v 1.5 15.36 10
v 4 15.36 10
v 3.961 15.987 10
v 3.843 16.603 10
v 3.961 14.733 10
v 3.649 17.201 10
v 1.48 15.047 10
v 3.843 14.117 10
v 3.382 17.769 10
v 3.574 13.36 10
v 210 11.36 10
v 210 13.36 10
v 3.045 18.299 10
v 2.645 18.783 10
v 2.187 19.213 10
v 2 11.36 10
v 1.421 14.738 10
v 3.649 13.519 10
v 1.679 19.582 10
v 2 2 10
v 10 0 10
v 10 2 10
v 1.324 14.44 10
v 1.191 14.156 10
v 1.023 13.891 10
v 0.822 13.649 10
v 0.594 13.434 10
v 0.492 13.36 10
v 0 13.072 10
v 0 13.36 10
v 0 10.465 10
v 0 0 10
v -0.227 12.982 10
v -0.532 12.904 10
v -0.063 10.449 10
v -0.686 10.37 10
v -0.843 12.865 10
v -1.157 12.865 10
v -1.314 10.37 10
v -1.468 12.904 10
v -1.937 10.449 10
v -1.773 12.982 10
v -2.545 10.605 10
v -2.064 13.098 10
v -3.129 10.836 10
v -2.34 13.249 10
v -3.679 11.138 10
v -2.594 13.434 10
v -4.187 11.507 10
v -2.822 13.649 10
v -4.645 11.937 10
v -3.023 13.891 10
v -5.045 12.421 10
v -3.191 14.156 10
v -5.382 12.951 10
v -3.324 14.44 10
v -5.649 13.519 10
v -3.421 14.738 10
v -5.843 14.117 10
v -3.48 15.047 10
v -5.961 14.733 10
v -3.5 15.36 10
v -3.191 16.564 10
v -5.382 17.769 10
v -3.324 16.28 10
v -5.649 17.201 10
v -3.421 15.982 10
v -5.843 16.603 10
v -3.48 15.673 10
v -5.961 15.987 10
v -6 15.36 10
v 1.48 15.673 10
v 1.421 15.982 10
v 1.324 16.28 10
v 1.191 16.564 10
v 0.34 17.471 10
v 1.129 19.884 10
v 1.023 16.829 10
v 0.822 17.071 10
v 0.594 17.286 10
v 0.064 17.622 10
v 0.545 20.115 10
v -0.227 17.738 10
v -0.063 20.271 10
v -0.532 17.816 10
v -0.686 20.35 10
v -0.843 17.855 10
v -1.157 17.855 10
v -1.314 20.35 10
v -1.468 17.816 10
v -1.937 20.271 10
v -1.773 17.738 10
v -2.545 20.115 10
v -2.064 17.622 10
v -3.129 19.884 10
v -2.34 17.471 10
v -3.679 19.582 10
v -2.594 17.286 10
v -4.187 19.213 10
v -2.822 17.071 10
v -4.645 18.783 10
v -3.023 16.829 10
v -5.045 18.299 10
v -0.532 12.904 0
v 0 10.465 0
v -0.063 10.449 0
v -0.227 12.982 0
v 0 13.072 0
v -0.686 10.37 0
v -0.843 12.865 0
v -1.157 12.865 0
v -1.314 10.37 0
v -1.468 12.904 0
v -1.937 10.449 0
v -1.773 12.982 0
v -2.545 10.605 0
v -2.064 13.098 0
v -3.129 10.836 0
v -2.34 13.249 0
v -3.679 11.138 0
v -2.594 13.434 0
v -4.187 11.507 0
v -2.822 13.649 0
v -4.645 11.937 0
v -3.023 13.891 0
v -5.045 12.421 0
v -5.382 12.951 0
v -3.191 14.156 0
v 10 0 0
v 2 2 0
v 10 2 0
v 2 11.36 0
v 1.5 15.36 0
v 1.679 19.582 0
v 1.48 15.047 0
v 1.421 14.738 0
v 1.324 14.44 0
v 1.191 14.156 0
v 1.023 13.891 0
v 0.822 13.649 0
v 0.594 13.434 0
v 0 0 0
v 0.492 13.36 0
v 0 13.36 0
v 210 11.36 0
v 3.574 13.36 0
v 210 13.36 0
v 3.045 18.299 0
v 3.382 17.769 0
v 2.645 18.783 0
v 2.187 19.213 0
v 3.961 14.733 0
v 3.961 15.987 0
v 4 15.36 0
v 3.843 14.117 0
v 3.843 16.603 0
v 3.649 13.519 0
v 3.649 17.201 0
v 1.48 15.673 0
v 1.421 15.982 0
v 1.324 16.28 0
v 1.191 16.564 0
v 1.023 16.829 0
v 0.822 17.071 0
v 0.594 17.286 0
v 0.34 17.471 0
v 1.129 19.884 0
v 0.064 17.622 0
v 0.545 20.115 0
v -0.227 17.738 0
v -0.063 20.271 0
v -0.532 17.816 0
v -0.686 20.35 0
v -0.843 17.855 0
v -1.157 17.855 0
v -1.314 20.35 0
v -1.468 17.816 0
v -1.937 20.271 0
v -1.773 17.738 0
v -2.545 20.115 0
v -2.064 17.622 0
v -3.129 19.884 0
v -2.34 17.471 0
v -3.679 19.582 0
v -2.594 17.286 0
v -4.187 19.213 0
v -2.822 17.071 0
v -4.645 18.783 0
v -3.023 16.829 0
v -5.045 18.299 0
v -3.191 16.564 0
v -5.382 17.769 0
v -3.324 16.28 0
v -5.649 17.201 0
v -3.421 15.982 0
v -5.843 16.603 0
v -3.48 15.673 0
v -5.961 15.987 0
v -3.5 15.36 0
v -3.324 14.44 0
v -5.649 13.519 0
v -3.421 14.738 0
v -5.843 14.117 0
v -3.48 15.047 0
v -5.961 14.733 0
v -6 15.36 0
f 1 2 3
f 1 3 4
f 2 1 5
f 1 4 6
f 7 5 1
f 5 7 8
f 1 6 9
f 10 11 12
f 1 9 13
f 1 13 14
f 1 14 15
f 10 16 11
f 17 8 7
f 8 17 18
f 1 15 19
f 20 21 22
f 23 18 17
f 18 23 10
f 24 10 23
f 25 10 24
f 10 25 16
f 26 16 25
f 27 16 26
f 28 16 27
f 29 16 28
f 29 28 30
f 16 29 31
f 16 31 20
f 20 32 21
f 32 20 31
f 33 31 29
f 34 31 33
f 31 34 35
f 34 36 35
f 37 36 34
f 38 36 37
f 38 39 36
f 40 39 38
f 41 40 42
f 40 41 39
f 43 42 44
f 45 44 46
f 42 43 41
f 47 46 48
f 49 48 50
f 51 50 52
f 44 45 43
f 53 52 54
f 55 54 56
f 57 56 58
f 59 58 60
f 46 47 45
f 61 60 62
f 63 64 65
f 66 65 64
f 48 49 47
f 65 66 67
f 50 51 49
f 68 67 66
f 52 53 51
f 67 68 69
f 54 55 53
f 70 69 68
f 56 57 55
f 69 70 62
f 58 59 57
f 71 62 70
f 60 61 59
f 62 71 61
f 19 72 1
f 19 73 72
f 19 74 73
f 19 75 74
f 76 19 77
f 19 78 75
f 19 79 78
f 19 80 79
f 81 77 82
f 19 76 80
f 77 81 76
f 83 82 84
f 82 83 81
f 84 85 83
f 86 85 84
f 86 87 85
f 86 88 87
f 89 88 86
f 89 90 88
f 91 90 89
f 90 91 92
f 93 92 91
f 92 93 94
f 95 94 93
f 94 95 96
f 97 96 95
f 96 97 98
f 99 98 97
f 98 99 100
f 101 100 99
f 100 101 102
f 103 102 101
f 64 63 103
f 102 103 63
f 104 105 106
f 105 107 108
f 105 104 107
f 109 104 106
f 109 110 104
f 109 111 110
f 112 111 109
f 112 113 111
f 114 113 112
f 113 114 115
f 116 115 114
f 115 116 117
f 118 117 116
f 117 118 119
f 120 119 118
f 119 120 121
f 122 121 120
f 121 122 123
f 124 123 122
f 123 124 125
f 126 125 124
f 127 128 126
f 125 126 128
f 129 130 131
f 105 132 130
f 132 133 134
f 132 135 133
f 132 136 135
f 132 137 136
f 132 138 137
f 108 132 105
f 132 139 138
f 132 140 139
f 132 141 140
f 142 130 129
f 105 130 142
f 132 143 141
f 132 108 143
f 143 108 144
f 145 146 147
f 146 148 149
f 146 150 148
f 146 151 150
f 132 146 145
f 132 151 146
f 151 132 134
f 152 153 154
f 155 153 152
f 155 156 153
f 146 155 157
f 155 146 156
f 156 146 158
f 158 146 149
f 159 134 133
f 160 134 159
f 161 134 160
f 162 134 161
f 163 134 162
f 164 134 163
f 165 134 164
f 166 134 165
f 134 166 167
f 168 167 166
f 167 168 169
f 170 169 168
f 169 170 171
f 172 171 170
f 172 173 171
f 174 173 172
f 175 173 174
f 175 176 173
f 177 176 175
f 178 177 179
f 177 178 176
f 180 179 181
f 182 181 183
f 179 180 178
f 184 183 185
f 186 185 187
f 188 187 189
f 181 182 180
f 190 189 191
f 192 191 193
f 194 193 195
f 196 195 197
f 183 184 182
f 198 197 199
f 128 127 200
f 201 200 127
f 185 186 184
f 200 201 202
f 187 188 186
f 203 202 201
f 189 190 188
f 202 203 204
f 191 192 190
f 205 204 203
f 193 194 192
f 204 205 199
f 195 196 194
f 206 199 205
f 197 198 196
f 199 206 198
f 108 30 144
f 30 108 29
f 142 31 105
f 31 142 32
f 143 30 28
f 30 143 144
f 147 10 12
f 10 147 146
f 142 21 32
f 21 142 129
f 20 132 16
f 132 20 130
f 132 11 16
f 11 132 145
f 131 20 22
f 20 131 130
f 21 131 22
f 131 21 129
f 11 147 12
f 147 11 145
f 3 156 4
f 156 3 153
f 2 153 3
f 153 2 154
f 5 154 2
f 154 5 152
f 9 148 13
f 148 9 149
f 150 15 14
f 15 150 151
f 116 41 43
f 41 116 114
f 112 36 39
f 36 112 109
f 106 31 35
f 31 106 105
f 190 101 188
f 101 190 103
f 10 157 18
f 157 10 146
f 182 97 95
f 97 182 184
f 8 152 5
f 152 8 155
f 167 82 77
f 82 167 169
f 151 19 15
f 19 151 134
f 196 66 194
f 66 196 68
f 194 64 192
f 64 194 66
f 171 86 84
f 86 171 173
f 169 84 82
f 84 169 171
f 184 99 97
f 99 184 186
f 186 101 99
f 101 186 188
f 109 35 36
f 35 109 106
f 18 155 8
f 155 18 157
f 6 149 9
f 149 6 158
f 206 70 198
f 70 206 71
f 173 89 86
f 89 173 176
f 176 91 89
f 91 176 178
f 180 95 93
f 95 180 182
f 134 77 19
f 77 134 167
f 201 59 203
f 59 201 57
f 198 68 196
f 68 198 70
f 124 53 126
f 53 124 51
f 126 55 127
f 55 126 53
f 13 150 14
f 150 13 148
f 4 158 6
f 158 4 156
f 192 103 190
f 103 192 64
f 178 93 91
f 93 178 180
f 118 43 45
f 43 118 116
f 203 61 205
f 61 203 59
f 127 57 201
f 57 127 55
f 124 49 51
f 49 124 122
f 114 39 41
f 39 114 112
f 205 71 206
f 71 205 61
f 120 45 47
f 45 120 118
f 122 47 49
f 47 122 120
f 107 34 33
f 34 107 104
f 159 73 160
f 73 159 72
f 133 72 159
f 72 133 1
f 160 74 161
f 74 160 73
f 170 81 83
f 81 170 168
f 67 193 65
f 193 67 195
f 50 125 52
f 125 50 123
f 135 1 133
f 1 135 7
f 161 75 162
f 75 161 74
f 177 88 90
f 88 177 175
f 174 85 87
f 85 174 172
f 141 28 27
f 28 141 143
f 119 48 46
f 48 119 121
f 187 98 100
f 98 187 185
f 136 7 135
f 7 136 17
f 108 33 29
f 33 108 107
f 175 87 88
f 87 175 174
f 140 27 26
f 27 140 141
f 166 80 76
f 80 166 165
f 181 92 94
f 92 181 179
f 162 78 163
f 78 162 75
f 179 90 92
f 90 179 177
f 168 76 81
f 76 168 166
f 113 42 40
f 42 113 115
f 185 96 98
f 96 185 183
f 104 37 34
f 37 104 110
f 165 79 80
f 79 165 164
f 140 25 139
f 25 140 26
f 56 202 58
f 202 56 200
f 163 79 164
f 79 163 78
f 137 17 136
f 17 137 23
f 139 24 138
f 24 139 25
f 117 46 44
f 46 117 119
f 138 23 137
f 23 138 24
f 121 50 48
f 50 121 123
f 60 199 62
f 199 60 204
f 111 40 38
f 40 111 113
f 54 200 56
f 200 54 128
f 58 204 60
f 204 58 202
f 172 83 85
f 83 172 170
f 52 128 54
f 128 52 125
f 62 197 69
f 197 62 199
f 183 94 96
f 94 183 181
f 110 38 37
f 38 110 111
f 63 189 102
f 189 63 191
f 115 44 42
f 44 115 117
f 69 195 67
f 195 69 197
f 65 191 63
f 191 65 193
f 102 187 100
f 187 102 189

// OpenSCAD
$fn=50;
module main() {
    XX=360;
    YY=11.36+2;
    ZZ=10;
    WW=2;
  difference() {
    cube([XX, YY, ZZ]);
    # translate([WW,WW,0]) cube([XX-2*WW, YY-2*WW, ZZ]);
    # translate([5*WW,0,0]) cube([XX-10*WW, YY-WW, ZZ]);



    # translate([210,0,0]) cube([XX,YY,ZZ]);
  }
  translate([-1,YY+2,0])
  difference() {
    cylinder(ZZ,d=10);
    cylinder(ZZ,d=5);
  }
}

main();
